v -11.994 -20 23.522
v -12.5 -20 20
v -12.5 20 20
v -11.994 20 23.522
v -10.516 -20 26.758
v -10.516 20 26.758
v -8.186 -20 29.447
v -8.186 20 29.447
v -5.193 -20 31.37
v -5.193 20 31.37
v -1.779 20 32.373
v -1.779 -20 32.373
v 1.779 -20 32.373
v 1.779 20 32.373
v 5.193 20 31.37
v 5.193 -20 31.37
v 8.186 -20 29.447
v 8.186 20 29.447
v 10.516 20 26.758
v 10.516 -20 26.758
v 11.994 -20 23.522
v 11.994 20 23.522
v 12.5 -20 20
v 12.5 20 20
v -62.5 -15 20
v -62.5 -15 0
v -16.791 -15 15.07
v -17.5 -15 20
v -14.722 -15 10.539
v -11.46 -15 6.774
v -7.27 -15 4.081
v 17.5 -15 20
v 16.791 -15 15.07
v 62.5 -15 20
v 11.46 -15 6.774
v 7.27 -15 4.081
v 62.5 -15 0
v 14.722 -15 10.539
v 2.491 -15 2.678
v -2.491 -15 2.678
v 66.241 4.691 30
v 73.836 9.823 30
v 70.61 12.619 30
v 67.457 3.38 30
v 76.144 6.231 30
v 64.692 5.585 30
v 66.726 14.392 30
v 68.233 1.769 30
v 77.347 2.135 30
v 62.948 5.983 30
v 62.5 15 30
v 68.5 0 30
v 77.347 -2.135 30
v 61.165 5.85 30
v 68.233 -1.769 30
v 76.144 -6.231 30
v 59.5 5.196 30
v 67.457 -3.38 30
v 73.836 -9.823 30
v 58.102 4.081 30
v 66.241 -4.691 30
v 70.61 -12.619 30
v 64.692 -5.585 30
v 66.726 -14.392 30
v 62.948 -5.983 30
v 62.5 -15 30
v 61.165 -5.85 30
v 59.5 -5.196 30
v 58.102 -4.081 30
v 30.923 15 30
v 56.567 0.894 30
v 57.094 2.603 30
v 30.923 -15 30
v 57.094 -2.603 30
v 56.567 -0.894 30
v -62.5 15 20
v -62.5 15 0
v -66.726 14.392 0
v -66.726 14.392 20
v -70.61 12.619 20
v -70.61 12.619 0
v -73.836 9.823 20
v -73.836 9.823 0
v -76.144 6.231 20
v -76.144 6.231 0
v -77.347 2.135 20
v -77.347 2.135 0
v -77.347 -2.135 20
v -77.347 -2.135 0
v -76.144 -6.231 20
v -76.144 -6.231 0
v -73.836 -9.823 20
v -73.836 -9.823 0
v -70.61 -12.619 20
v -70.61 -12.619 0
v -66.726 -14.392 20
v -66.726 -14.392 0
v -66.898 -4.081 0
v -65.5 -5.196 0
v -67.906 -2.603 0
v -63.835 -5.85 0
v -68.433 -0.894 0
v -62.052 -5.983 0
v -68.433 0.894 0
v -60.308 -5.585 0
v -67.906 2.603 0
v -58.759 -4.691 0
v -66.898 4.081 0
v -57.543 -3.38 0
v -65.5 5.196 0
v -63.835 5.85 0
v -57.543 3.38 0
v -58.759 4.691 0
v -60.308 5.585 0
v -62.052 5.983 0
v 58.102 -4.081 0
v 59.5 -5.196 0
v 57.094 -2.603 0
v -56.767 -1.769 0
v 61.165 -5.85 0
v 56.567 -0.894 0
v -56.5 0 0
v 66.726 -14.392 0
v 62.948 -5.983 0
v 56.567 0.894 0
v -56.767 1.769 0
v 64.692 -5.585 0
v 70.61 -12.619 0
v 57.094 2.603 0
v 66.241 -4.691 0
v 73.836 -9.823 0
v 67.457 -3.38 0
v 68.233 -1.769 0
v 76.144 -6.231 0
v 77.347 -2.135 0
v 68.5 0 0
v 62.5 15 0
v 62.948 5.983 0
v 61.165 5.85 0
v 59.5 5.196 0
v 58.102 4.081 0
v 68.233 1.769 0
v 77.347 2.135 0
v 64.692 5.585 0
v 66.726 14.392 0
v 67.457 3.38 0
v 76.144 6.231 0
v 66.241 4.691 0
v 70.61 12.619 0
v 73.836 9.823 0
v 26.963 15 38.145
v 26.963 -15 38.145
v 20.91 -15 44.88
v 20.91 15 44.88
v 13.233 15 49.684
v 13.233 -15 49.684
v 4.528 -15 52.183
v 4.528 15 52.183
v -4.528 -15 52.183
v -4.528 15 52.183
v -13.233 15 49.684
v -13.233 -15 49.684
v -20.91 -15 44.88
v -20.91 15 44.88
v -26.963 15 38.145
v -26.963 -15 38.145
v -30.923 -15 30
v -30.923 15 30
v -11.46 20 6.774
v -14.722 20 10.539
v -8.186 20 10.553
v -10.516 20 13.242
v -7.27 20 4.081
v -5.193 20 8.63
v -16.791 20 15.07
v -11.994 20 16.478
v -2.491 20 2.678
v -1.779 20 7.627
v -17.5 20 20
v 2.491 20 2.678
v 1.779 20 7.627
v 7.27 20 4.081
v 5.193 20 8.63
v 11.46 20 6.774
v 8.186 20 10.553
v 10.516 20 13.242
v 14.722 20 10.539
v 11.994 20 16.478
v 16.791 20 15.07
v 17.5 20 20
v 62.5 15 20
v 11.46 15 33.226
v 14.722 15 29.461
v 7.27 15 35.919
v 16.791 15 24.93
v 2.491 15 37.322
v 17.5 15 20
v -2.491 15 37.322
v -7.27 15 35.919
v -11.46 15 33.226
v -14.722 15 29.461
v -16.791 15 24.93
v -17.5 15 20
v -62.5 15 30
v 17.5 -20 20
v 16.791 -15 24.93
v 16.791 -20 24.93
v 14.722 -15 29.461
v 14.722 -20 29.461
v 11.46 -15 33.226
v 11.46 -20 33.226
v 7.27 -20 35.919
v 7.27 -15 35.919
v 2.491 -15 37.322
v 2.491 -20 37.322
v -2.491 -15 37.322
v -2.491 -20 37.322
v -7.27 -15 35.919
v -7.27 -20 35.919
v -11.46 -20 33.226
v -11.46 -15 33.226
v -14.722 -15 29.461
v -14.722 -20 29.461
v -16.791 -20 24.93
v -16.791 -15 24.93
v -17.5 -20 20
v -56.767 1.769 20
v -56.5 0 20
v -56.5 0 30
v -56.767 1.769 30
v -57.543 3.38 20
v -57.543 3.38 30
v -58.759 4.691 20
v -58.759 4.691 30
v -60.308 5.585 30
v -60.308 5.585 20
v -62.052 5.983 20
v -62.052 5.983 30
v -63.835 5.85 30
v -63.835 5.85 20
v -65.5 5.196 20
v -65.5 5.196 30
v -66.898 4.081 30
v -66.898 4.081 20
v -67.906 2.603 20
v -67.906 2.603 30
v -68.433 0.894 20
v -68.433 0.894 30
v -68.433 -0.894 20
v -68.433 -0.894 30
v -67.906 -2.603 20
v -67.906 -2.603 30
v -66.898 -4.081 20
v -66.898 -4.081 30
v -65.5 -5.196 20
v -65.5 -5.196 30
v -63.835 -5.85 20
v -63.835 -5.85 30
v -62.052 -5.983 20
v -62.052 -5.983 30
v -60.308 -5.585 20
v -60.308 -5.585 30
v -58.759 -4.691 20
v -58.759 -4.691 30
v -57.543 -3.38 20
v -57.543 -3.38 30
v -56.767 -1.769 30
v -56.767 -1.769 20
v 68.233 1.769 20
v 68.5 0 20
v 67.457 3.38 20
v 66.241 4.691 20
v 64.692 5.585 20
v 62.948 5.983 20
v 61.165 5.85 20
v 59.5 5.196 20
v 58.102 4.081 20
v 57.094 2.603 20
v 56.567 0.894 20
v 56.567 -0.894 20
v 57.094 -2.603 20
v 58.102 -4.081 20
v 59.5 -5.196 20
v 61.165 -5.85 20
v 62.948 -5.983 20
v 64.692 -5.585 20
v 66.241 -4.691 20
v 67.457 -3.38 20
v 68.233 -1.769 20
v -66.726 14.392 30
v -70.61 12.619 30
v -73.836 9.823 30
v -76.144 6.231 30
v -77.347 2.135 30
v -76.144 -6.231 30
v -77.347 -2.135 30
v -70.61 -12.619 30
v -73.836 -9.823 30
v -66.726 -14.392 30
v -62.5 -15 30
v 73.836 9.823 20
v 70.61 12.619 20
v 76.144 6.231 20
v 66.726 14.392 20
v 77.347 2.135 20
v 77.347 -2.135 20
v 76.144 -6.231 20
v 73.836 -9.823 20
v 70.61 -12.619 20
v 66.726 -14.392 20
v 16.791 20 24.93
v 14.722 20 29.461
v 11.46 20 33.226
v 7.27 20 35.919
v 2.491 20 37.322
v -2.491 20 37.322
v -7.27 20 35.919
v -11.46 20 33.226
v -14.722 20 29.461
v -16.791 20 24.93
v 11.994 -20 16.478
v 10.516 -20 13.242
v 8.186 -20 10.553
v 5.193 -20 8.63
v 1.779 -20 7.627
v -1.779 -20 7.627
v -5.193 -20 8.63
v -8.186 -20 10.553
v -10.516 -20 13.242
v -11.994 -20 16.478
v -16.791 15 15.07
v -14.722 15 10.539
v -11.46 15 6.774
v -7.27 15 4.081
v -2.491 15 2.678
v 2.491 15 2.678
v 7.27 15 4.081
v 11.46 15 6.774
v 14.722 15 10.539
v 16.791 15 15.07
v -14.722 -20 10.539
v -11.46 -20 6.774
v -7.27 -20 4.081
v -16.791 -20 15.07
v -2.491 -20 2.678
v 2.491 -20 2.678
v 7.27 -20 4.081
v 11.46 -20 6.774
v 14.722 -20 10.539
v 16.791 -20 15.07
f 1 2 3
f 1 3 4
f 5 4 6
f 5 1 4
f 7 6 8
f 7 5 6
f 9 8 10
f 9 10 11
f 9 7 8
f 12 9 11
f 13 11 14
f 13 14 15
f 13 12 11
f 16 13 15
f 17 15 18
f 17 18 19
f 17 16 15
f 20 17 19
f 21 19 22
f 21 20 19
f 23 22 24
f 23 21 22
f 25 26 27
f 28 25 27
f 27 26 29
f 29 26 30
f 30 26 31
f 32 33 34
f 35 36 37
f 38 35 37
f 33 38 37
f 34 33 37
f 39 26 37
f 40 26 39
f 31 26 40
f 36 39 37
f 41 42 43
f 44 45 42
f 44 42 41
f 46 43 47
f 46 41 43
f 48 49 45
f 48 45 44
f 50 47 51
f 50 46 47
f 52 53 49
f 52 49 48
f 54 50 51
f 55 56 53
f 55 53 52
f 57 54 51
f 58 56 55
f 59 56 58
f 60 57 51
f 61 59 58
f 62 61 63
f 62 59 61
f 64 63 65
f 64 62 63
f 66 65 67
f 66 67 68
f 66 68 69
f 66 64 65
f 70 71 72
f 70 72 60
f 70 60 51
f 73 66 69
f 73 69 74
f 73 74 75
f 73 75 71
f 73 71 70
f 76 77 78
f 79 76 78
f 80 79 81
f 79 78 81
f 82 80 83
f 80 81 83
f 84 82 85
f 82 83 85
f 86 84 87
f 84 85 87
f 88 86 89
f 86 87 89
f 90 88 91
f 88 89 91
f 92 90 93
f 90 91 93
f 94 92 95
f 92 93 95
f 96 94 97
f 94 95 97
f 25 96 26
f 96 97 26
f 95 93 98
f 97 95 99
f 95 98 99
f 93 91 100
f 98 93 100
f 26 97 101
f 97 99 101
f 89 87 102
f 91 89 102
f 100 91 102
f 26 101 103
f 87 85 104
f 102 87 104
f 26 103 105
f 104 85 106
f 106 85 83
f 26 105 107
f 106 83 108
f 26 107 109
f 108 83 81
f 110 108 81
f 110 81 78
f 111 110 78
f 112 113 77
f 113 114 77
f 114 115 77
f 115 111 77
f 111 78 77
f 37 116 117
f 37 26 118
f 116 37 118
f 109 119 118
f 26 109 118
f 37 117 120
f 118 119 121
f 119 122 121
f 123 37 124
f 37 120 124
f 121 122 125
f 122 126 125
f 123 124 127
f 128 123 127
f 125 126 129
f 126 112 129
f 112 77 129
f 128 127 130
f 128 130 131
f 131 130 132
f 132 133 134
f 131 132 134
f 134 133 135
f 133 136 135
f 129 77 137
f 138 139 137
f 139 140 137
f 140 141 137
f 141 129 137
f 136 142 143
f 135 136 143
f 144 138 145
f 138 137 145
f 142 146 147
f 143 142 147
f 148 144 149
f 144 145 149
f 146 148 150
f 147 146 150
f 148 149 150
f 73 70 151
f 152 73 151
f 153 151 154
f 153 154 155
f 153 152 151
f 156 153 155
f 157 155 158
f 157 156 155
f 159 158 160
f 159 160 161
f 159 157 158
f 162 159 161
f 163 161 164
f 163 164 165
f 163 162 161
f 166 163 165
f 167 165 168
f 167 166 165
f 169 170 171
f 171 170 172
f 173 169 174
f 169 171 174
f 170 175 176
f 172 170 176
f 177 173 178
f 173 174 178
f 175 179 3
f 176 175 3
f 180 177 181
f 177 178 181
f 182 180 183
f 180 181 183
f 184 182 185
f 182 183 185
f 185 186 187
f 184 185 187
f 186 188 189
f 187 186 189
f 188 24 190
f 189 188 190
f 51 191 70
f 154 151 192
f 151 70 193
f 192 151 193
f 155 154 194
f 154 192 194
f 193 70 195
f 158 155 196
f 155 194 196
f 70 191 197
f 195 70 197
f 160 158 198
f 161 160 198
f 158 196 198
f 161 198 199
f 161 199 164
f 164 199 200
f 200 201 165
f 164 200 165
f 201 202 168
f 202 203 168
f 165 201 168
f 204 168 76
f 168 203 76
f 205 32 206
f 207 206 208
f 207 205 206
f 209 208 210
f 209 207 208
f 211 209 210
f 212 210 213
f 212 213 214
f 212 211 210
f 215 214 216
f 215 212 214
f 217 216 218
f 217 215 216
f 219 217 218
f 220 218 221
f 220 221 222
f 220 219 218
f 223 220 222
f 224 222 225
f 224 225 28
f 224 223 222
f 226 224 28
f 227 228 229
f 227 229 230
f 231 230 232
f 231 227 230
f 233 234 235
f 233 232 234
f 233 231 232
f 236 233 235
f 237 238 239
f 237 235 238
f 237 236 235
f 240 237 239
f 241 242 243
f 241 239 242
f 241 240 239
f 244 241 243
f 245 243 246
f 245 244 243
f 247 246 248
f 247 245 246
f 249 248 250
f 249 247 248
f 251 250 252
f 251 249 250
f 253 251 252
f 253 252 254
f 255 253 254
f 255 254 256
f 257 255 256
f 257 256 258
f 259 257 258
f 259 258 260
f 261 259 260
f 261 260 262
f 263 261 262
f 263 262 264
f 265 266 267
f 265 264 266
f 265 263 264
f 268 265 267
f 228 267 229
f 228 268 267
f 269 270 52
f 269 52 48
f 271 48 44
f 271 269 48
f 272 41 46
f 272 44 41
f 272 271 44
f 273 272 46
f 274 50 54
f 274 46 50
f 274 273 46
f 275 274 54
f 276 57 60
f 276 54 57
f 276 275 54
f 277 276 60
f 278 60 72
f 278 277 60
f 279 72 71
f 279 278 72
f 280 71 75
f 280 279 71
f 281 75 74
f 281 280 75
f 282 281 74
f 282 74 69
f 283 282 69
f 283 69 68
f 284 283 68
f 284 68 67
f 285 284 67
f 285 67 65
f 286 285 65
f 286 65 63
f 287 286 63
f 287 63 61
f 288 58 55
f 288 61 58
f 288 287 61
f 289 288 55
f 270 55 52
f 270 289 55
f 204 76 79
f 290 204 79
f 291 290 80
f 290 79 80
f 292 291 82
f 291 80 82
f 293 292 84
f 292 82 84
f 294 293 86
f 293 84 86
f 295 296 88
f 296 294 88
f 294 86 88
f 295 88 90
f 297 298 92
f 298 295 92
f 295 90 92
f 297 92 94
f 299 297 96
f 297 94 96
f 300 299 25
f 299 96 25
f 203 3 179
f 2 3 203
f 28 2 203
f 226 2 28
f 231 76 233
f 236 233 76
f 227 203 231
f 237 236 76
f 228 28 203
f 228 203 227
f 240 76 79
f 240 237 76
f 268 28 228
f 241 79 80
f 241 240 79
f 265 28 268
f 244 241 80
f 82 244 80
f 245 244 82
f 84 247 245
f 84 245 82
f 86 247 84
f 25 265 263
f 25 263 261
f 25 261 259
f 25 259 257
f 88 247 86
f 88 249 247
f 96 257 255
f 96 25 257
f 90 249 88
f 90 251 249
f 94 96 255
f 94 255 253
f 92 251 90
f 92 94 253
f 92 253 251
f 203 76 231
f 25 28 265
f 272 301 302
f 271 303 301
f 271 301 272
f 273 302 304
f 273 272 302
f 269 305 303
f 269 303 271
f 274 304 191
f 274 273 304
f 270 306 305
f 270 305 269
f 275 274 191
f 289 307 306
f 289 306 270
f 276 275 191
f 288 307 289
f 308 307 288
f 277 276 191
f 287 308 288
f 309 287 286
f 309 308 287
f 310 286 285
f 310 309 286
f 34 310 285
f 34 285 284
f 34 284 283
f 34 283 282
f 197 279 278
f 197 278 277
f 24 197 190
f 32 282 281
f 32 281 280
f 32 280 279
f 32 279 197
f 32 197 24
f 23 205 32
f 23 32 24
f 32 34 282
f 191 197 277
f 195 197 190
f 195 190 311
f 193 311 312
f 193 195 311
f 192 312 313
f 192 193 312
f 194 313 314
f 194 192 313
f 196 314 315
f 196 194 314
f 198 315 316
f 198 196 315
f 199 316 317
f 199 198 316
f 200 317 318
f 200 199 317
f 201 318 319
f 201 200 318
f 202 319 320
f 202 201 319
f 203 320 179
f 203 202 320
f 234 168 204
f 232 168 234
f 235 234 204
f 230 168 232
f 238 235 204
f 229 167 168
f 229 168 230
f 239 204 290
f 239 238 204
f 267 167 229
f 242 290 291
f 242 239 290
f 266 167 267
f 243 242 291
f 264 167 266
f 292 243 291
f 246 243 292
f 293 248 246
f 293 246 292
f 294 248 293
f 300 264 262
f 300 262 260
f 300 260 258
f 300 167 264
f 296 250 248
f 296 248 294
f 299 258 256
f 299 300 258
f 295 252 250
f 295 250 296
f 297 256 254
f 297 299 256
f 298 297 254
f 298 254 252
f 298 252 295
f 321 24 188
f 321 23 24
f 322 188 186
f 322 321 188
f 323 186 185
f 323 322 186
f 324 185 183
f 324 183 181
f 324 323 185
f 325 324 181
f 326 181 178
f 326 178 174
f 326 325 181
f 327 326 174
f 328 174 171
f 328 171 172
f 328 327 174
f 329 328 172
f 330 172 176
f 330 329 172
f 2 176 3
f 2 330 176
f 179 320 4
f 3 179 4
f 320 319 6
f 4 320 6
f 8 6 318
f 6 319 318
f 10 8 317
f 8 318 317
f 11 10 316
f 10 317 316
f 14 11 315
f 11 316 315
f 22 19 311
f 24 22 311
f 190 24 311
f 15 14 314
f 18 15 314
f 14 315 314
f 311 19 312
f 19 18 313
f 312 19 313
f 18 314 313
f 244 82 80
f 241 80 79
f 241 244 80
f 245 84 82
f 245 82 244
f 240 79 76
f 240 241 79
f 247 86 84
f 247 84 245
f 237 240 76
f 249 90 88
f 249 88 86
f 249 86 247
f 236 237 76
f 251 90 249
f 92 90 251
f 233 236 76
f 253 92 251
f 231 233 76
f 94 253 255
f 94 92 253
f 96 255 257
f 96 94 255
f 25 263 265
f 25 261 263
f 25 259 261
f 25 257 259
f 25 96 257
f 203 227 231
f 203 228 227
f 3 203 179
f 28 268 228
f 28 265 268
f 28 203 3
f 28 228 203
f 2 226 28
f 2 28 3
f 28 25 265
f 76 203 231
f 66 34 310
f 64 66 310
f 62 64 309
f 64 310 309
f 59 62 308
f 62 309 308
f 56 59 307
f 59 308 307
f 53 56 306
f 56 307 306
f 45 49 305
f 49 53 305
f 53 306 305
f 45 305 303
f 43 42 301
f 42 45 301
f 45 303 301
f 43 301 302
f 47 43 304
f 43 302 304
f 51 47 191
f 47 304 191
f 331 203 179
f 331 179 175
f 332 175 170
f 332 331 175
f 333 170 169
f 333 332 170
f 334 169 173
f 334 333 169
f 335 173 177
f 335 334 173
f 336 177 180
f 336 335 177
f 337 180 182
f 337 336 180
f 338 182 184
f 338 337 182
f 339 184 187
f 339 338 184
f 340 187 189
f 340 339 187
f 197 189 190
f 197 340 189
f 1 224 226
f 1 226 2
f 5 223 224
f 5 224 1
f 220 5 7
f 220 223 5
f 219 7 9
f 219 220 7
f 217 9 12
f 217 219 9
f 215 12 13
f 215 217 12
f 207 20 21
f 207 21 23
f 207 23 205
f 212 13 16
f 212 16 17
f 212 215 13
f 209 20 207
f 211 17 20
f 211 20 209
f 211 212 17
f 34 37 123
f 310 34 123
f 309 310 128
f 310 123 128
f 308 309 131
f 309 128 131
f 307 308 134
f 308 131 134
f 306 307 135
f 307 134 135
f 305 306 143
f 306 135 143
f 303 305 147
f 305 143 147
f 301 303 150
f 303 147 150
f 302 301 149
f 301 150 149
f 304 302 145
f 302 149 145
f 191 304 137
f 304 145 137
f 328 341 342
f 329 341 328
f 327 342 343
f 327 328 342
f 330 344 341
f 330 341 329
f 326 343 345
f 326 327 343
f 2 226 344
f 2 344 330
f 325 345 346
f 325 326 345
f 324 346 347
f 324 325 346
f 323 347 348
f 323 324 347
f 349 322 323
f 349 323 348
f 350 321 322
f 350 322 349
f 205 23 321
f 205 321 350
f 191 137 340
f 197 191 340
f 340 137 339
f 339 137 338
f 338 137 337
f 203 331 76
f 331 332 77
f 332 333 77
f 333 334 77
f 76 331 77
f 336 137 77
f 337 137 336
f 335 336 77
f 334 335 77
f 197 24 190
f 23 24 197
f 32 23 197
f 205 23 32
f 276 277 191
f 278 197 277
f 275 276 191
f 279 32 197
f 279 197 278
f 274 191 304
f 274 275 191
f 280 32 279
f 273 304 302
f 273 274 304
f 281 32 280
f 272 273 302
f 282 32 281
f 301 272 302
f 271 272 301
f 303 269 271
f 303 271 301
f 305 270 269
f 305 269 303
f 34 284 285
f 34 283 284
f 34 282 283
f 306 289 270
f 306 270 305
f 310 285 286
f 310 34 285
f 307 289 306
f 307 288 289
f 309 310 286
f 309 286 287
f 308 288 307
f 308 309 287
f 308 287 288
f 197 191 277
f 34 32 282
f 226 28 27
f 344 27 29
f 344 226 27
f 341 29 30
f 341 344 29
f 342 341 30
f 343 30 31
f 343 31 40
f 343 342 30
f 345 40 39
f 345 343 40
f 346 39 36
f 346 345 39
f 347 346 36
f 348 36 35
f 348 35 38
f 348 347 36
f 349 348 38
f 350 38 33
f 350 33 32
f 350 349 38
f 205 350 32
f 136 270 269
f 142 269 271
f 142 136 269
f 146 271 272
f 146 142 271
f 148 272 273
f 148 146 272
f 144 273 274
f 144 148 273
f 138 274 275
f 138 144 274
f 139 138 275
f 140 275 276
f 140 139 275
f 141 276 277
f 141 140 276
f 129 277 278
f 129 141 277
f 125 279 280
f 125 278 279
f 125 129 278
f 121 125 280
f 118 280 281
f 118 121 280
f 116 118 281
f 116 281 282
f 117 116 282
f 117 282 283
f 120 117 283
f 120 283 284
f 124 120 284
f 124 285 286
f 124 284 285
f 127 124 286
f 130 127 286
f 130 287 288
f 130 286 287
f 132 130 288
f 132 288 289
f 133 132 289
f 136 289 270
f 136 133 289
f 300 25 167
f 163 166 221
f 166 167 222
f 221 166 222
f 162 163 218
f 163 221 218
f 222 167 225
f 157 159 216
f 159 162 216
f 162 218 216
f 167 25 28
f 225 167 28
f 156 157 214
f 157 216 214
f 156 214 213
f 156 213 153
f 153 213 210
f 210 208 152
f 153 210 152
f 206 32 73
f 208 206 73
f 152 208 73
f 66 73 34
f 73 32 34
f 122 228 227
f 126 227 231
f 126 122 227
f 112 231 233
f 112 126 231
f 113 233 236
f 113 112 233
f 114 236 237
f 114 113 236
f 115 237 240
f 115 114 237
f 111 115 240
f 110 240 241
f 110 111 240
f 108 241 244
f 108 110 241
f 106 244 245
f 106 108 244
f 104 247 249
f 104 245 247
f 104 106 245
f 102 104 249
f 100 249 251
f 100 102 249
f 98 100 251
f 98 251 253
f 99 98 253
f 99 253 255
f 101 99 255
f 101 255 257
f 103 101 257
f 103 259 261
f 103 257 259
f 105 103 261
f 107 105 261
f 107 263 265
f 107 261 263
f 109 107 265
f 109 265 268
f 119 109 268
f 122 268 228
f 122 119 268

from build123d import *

# Parameters (mm, degrees)
F2_DEPTH = 21.5
F3_DEPTH = 23.9
F1_R     = 6
F4_DEPTH = 69.6
F5_DEPTH = 20
F6_DEPTH = 20


with BuildPart() as f2:
    # F0 (on Front) → F2 (new body, symmetric)
    with BuildSketch(Plane.XZ):
        with BuildLine():
            Line((-116.4417862892, 0), (0, 0))
            Line((0, 0), (116.4417862892, 0))
            Line((116.4417862892, 0), (116.4417862892, 20))
            Line((116.4417862892, 20), (17.5, 20))
            ThreePointArc((17.5, 20), (0, 2.5), (-17.5, 20))
            Line((-17.5, 20), (-116.4417862892, 20))
            Line((-116.4417862892, 20), (-116.4417862892, 0))
        make_face()
    extrude(amount=F2_DEPTH, both=True)


with BuildPart() as f3:
    # F0 (on Front) → F3 (new body, symmetric)
    with BuildSketch(Plane.XZ):
        with BuildLine():
            Line((-116.4417862892, 30), (-116.4417862892, 20))
            Line((-116.4417862892, 20), (-17.5, 20))
            ThreePointArc((-17.5, 20), (0, 37.5), (17.5, 20))
            Line((17.5, 20), (116.4417862892, 20))
            Line((116.4417862892, 20), (116.4417862892, 30))
            Line((116.4417862892, 30), (30.9232921921, 30))
            ThreePointArc((30.9232921921, 30), (0, 52.5), (-30.9232921921, 30))
            Line((-30.9232921921, 30), (-116.4417862892, 30))
        make_face()
    extrude(amount=F3_DEPTH, both=True)


with BuildPart() as f4_tool:
    # F1 (on Top) → F4 (new body)
    with BuildSketch(Plane.XY):
        with BuildLine():
            Line((62.5, 15), (-62.5, 15))
            ThreePointArc((-62.5, 15), (-77.5, 0), (-62.5, -15))
            Line((-62.5, -15), (62.5, -15))
            ThreePointArc((62.5, -15), (77.5, 0), (62.5, 15))
        make_face()
        with Locations((-62.5, 0)):
            Circle(F1_R, mode=Mode.SUBTRACT)
        with Locations((62.5, 0)):
            Circle(F1_R, mode=Mode.SUBTRACT)
    extrude(amount=F4_DEPTH)


with BuildPart() as f2_1:
    add(f2.part)

    # F4: intersect by f4_tool
    add(f4_tool.part, mode=Mode.INTERSECT)

    # F0 (on Front) → F5 (join, symmetric)
    with BuildSketch(Plane.XZ):
        with BuildLine():
            Line((-12.5, 20), (-17.5, 20))
            ThreePointArc((-17.5, 20), (0, 2.5), (17.5, 20))
            Line((17.5, 20), (12.5, 20))
            ThreePointArc((12.5, 20), (0, 7.5), (-12.5, 20))
        make_face()
    extrude(amount=F5_DEPTH, both=True)


with BuildPart() as f3_1:
    add(f3.part)

    # F4: intersect by f4_tool
    add(f4_tool.part, mode=Mode.INTERSECT)

    # F0 (on Front) → F6 (join, symmetric)
    with BuildSketch(Plane.XZ):
        with BuildLine():
            ThreePointArc((17.5, 20), (0, 37.5), (-17.5, 20))
            Line((-17.5, 20), (-12.5, 20))
            ThreePointArc((-12.5, 20), (0, 32.5), (12.5, 20))
            Line((12.5, 20), (17.5, 20))
        make_face()
    extrude(amount=F6_DEPTH, both=True)


solid = Compound([f2_1.part, f3_1.part])
